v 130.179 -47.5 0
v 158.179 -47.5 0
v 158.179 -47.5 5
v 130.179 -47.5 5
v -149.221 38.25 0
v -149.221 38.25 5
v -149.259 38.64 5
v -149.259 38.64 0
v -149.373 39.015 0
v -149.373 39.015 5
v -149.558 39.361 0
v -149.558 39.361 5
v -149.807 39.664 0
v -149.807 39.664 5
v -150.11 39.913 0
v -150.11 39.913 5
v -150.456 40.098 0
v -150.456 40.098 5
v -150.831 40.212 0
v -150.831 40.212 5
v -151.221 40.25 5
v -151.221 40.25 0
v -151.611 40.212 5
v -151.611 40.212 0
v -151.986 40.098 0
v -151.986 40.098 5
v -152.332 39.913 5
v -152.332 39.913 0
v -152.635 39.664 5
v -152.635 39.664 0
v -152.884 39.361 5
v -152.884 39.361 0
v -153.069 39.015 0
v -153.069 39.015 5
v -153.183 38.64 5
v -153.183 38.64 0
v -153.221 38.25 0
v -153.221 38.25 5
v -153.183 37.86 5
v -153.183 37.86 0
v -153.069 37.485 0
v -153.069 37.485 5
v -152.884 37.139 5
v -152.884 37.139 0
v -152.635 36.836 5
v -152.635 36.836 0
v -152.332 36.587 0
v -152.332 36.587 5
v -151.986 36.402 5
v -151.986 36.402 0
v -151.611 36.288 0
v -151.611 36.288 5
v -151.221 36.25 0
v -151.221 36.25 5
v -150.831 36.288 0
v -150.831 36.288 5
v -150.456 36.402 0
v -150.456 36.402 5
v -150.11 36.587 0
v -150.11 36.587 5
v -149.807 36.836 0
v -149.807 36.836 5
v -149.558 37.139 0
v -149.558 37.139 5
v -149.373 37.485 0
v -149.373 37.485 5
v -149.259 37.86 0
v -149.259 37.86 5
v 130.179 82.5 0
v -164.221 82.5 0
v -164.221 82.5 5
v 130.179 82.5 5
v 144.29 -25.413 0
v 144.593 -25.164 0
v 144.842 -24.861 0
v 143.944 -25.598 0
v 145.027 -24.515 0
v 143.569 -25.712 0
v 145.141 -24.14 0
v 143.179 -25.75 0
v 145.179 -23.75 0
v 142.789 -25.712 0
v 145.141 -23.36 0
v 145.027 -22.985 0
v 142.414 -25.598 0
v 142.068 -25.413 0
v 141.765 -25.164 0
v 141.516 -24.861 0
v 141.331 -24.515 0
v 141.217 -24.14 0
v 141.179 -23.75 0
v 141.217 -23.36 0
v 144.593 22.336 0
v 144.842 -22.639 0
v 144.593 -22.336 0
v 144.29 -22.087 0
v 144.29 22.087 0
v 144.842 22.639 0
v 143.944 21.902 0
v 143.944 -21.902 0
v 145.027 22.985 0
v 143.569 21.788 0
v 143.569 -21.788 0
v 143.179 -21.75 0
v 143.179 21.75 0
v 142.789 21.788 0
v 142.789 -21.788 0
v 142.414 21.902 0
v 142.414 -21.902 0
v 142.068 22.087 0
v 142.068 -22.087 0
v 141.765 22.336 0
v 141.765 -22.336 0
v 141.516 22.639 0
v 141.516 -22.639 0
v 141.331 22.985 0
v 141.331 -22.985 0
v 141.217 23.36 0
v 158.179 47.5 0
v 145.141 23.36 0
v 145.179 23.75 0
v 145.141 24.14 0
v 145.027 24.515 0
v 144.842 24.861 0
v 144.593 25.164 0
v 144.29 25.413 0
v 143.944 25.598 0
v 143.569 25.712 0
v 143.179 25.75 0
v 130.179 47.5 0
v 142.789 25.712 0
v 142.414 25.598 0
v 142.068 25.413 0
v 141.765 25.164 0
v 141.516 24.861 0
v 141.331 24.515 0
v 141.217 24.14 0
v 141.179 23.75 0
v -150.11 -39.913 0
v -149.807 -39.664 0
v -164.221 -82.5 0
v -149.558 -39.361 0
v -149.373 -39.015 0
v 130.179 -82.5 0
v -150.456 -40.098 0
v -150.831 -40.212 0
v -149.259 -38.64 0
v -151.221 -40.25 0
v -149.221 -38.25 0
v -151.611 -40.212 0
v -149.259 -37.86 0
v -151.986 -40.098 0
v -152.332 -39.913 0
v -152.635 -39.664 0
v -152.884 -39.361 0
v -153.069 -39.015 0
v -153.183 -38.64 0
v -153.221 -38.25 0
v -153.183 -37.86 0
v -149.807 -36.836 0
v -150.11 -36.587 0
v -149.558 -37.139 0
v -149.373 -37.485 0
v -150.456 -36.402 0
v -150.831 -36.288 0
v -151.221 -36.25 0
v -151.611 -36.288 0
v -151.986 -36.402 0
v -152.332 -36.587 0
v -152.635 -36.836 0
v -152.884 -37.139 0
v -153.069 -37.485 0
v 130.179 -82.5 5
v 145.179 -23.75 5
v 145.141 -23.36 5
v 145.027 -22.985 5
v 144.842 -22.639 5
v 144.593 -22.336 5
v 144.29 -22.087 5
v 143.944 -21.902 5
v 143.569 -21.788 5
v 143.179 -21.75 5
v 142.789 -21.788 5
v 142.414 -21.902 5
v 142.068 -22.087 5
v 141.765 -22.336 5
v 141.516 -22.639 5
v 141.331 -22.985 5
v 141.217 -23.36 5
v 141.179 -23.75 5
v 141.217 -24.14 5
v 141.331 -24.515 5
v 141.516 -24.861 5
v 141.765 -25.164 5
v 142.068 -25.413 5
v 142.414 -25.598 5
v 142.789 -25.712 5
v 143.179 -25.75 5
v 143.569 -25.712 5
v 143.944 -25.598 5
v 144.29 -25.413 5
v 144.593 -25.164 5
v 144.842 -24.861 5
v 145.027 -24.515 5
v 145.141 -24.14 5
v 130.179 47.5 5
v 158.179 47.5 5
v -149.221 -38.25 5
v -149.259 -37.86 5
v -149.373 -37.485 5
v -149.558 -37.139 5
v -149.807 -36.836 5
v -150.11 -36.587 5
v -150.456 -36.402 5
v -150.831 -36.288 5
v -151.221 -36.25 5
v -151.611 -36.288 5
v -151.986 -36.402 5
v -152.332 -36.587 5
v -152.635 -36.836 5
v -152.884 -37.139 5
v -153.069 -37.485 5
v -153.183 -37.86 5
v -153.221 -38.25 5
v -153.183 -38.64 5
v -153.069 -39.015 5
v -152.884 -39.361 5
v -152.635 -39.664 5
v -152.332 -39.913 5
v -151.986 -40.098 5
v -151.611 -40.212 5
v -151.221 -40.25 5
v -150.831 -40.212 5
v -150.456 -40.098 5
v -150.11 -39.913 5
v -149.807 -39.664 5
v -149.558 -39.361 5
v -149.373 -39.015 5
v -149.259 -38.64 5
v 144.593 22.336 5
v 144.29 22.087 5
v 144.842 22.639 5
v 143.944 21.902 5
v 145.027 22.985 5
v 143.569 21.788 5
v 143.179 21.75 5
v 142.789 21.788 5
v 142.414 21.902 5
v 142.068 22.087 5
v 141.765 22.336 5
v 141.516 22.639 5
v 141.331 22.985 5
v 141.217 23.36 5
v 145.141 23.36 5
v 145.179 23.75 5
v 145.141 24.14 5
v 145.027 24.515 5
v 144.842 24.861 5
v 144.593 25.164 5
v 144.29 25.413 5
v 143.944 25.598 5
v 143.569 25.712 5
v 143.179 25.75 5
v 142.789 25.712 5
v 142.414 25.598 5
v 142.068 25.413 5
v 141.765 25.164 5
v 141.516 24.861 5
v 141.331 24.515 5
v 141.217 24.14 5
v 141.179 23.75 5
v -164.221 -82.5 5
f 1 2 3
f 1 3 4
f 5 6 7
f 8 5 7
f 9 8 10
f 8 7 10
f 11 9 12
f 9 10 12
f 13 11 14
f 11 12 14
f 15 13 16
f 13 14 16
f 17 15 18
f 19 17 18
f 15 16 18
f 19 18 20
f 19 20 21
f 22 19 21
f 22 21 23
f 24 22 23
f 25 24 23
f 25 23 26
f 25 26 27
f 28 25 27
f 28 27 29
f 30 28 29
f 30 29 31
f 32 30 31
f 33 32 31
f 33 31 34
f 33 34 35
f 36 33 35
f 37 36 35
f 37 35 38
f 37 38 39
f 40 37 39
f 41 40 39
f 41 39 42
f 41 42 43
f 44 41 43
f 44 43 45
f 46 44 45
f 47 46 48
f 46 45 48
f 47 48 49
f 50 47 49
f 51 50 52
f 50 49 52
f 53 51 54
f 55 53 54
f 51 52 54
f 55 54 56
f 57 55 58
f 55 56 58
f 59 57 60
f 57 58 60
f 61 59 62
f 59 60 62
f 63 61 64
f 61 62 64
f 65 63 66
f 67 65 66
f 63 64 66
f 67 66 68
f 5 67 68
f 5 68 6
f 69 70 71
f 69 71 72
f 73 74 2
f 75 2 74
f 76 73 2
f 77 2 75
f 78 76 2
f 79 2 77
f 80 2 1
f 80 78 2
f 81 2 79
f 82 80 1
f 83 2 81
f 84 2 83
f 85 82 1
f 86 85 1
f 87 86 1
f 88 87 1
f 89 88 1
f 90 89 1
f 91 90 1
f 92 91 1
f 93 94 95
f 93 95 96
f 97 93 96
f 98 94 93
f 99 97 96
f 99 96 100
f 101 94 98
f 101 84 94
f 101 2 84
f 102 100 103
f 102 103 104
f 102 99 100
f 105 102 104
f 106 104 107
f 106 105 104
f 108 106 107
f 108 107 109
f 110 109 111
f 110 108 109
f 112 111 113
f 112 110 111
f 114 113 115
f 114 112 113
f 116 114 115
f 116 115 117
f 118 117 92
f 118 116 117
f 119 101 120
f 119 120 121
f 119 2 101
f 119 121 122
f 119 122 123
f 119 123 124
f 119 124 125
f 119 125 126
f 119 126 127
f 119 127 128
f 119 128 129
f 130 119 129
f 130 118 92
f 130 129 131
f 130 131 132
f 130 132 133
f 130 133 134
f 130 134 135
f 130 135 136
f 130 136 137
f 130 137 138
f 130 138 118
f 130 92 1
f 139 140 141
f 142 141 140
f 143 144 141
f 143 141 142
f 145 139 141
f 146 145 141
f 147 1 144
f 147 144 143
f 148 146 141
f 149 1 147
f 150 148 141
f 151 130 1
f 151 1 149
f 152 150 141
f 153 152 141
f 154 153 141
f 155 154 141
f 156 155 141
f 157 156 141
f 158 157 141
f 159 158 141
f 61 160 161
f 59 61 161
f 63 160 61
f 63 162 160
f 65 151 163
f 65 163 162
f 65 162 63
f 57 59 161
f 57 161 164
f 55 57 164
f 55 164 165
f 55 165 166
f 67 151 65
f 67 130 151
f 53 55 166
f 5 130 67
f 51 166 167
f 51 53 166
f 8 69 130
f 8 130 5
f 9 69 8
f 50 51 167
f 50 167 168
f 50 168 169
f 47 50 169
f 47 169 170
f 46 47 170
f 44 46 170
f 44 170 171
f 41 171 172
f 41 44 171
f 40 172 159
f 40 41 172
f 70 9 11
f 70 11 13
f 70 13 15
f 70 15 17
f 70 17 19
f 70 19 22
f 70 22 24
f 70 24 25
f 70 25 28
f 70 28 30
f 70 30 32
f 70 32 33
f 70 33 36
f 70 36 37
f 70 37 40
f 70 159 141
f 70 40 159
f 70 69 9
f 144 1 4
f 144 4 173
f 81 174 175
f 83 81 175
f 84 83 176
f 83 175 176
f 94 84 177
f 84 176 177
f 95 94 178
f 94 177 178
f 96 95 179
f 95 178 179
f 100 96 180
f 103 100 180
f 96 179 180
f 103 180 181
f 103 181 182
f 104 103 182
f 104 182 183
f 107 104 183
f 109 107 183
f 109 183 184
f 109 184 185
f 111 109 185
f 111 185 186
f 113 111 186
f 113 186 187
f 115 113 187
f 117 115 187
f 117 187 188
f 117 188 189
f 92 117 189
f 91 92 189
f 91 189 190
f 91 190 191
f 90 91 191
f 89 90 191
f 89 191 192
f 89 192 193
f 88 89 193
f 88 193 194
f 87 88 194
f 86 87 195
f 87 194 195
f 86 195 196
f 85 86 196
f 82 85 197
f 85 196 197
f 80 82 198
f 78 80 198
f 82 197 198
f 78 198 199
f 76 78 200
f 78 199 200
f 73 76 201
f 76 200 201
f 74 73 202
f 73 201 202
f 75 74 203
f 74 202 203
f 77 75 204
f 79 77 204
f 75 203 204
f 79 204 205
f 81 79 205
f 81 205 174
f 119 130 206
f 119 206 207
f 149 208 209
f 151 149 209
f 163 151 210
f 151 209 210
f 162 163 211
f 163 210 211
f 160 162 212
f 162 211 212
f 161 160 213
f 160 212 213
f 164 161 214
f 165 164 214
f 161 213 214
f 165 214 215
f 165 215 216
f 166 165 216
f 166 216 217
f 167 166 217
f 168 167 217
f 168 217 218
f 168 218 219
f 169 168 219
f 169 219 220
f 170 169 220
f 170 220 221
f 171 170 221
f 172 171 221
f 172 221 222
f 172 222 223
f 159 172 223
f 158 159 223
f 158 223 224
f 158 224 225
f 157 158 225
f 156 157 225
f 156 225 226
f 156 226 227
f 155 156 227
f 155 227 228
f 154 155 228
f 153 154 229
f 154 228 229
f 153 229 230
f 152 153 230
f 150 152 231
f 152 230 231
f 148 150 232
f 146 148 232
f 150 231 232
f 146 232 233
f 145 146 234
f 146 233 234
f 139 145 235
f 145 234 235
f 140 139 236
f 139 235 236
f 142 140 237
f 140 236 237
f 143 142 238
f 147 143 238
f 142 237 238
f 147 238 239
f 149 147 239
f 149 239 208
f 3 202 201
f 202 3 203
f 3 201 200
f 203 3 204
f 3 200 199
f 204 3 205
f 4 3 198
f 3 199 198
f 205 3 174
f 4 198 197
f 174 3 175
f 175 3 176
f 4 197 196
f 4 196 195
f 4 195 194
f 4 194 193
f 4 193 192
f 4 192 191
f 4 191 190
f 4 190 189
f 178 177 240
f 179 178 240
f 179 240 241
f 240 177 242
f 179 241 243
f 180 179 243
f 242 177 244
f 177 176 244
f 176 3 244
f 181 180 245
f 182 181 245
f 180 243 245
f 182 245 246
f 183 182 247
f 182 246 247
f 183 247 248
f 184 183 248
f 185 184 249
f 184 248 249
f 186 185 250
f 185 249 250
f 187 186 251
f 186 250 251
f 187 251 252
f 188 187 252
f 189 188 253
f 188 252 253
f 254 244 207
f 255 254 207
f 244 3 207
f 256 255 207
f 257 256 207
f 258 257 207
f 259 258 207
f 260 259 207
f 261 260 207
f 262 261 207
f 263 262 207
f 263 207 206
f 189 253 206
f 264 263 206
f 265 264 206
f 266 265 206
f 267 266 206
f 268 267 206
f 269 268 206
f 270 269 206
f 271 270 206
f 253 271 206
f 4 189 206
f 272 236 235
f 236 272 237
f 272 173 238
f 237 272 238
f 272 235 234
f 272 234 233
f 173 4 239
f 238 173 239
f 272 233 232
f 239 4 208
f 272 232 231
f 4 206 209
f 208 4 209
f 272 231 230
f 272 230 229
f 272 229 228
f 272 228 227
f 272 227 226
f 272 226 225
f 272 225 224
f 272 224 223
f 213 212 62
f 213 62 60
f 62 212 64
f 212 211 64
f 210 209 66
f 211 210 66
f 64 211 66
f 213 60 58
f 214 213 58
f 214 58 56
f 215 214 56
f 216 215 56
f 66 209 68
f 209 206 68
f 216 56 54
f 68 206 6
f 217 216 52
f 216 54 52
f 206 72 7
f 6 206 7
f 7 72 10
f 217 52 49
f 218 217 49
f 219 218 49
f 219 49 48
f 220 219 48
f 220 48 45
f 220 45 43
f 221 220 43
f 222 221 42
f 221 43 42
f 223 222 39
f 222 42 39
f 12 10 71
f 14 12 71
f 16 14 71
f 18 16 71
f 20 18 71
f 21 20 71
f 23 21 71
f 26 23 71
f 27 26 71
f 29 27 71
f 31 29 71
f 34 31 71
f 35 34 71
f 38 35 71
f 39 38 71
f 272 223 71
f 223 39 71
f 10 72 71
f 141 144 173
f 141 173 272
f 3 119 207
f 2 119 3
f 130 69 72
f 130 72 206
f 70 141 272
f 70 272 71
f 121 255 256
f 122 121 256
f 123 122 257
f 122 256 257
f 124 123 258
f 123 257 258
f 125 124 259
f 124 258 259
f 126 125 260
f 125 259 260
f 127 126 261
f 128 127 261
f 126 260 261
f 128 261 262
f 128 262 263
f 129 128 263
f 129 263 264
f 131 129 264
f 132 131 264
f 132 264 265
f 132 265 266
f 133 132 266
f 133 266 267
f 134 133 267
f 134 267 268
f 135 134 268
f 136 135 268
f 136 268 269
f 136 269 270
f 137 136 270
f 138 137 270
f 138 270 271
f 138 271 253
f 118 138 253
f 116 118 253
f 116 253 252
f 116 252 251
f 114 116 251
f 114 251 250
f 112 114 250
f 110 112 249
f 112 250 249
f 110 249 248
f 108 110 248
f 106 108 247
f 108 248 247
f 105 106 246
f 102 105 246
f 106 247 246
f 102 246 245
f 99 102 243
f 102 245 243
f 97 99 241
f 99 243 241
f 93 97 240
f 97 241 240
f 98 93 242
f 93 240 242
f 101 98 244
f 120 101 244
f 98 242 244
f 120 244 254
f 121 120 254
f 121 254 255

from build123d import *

# Parameters (mm, degrees)
BOSS_EXTRUDE1_DEPTH = 5
SKETCH2_R           = 2
CUT_EXTRUDE1_DEPTH  = 10


with BuildPart() as part:
    # Sketch1 → Boss-Extrude1 (new body)
    with BuildSketch(Plane.XY):
        Polygon((-164.220930233, -82.5), (-164.220930233, 82.5), (130.179069767, 82.5), (130.179069767, 47.5), (158.179069767, 47.5), (158.179069767, -47.5), (130.179069767, -47.5), (130.179069767, -82.5), align=None)
    extrude(amount=BOSS_EXTRUDE1_DEPTH)

    # Sketch2 → Cut-Extrude1 (cut)
    with BuildSketch(Plane.XY.offset(5)):
        with Locations((-151.220930233, 38.25)):
            Circle(SKETCH2_R)
        with Locations((-151.220930233, -38.25)):
            Circle(SKETCH2_R)
        with Locations((143.179069767, 23.75)):
            Circle(SKETCH2_R)
        with Locations((143.179069767, -23.75)):
            Circle(SKETCH2_R)
    extrude(amount=-CUT_EXTRUDE1_DEPTH, mode=Mode.SUBTRACT)


solid = part.part
